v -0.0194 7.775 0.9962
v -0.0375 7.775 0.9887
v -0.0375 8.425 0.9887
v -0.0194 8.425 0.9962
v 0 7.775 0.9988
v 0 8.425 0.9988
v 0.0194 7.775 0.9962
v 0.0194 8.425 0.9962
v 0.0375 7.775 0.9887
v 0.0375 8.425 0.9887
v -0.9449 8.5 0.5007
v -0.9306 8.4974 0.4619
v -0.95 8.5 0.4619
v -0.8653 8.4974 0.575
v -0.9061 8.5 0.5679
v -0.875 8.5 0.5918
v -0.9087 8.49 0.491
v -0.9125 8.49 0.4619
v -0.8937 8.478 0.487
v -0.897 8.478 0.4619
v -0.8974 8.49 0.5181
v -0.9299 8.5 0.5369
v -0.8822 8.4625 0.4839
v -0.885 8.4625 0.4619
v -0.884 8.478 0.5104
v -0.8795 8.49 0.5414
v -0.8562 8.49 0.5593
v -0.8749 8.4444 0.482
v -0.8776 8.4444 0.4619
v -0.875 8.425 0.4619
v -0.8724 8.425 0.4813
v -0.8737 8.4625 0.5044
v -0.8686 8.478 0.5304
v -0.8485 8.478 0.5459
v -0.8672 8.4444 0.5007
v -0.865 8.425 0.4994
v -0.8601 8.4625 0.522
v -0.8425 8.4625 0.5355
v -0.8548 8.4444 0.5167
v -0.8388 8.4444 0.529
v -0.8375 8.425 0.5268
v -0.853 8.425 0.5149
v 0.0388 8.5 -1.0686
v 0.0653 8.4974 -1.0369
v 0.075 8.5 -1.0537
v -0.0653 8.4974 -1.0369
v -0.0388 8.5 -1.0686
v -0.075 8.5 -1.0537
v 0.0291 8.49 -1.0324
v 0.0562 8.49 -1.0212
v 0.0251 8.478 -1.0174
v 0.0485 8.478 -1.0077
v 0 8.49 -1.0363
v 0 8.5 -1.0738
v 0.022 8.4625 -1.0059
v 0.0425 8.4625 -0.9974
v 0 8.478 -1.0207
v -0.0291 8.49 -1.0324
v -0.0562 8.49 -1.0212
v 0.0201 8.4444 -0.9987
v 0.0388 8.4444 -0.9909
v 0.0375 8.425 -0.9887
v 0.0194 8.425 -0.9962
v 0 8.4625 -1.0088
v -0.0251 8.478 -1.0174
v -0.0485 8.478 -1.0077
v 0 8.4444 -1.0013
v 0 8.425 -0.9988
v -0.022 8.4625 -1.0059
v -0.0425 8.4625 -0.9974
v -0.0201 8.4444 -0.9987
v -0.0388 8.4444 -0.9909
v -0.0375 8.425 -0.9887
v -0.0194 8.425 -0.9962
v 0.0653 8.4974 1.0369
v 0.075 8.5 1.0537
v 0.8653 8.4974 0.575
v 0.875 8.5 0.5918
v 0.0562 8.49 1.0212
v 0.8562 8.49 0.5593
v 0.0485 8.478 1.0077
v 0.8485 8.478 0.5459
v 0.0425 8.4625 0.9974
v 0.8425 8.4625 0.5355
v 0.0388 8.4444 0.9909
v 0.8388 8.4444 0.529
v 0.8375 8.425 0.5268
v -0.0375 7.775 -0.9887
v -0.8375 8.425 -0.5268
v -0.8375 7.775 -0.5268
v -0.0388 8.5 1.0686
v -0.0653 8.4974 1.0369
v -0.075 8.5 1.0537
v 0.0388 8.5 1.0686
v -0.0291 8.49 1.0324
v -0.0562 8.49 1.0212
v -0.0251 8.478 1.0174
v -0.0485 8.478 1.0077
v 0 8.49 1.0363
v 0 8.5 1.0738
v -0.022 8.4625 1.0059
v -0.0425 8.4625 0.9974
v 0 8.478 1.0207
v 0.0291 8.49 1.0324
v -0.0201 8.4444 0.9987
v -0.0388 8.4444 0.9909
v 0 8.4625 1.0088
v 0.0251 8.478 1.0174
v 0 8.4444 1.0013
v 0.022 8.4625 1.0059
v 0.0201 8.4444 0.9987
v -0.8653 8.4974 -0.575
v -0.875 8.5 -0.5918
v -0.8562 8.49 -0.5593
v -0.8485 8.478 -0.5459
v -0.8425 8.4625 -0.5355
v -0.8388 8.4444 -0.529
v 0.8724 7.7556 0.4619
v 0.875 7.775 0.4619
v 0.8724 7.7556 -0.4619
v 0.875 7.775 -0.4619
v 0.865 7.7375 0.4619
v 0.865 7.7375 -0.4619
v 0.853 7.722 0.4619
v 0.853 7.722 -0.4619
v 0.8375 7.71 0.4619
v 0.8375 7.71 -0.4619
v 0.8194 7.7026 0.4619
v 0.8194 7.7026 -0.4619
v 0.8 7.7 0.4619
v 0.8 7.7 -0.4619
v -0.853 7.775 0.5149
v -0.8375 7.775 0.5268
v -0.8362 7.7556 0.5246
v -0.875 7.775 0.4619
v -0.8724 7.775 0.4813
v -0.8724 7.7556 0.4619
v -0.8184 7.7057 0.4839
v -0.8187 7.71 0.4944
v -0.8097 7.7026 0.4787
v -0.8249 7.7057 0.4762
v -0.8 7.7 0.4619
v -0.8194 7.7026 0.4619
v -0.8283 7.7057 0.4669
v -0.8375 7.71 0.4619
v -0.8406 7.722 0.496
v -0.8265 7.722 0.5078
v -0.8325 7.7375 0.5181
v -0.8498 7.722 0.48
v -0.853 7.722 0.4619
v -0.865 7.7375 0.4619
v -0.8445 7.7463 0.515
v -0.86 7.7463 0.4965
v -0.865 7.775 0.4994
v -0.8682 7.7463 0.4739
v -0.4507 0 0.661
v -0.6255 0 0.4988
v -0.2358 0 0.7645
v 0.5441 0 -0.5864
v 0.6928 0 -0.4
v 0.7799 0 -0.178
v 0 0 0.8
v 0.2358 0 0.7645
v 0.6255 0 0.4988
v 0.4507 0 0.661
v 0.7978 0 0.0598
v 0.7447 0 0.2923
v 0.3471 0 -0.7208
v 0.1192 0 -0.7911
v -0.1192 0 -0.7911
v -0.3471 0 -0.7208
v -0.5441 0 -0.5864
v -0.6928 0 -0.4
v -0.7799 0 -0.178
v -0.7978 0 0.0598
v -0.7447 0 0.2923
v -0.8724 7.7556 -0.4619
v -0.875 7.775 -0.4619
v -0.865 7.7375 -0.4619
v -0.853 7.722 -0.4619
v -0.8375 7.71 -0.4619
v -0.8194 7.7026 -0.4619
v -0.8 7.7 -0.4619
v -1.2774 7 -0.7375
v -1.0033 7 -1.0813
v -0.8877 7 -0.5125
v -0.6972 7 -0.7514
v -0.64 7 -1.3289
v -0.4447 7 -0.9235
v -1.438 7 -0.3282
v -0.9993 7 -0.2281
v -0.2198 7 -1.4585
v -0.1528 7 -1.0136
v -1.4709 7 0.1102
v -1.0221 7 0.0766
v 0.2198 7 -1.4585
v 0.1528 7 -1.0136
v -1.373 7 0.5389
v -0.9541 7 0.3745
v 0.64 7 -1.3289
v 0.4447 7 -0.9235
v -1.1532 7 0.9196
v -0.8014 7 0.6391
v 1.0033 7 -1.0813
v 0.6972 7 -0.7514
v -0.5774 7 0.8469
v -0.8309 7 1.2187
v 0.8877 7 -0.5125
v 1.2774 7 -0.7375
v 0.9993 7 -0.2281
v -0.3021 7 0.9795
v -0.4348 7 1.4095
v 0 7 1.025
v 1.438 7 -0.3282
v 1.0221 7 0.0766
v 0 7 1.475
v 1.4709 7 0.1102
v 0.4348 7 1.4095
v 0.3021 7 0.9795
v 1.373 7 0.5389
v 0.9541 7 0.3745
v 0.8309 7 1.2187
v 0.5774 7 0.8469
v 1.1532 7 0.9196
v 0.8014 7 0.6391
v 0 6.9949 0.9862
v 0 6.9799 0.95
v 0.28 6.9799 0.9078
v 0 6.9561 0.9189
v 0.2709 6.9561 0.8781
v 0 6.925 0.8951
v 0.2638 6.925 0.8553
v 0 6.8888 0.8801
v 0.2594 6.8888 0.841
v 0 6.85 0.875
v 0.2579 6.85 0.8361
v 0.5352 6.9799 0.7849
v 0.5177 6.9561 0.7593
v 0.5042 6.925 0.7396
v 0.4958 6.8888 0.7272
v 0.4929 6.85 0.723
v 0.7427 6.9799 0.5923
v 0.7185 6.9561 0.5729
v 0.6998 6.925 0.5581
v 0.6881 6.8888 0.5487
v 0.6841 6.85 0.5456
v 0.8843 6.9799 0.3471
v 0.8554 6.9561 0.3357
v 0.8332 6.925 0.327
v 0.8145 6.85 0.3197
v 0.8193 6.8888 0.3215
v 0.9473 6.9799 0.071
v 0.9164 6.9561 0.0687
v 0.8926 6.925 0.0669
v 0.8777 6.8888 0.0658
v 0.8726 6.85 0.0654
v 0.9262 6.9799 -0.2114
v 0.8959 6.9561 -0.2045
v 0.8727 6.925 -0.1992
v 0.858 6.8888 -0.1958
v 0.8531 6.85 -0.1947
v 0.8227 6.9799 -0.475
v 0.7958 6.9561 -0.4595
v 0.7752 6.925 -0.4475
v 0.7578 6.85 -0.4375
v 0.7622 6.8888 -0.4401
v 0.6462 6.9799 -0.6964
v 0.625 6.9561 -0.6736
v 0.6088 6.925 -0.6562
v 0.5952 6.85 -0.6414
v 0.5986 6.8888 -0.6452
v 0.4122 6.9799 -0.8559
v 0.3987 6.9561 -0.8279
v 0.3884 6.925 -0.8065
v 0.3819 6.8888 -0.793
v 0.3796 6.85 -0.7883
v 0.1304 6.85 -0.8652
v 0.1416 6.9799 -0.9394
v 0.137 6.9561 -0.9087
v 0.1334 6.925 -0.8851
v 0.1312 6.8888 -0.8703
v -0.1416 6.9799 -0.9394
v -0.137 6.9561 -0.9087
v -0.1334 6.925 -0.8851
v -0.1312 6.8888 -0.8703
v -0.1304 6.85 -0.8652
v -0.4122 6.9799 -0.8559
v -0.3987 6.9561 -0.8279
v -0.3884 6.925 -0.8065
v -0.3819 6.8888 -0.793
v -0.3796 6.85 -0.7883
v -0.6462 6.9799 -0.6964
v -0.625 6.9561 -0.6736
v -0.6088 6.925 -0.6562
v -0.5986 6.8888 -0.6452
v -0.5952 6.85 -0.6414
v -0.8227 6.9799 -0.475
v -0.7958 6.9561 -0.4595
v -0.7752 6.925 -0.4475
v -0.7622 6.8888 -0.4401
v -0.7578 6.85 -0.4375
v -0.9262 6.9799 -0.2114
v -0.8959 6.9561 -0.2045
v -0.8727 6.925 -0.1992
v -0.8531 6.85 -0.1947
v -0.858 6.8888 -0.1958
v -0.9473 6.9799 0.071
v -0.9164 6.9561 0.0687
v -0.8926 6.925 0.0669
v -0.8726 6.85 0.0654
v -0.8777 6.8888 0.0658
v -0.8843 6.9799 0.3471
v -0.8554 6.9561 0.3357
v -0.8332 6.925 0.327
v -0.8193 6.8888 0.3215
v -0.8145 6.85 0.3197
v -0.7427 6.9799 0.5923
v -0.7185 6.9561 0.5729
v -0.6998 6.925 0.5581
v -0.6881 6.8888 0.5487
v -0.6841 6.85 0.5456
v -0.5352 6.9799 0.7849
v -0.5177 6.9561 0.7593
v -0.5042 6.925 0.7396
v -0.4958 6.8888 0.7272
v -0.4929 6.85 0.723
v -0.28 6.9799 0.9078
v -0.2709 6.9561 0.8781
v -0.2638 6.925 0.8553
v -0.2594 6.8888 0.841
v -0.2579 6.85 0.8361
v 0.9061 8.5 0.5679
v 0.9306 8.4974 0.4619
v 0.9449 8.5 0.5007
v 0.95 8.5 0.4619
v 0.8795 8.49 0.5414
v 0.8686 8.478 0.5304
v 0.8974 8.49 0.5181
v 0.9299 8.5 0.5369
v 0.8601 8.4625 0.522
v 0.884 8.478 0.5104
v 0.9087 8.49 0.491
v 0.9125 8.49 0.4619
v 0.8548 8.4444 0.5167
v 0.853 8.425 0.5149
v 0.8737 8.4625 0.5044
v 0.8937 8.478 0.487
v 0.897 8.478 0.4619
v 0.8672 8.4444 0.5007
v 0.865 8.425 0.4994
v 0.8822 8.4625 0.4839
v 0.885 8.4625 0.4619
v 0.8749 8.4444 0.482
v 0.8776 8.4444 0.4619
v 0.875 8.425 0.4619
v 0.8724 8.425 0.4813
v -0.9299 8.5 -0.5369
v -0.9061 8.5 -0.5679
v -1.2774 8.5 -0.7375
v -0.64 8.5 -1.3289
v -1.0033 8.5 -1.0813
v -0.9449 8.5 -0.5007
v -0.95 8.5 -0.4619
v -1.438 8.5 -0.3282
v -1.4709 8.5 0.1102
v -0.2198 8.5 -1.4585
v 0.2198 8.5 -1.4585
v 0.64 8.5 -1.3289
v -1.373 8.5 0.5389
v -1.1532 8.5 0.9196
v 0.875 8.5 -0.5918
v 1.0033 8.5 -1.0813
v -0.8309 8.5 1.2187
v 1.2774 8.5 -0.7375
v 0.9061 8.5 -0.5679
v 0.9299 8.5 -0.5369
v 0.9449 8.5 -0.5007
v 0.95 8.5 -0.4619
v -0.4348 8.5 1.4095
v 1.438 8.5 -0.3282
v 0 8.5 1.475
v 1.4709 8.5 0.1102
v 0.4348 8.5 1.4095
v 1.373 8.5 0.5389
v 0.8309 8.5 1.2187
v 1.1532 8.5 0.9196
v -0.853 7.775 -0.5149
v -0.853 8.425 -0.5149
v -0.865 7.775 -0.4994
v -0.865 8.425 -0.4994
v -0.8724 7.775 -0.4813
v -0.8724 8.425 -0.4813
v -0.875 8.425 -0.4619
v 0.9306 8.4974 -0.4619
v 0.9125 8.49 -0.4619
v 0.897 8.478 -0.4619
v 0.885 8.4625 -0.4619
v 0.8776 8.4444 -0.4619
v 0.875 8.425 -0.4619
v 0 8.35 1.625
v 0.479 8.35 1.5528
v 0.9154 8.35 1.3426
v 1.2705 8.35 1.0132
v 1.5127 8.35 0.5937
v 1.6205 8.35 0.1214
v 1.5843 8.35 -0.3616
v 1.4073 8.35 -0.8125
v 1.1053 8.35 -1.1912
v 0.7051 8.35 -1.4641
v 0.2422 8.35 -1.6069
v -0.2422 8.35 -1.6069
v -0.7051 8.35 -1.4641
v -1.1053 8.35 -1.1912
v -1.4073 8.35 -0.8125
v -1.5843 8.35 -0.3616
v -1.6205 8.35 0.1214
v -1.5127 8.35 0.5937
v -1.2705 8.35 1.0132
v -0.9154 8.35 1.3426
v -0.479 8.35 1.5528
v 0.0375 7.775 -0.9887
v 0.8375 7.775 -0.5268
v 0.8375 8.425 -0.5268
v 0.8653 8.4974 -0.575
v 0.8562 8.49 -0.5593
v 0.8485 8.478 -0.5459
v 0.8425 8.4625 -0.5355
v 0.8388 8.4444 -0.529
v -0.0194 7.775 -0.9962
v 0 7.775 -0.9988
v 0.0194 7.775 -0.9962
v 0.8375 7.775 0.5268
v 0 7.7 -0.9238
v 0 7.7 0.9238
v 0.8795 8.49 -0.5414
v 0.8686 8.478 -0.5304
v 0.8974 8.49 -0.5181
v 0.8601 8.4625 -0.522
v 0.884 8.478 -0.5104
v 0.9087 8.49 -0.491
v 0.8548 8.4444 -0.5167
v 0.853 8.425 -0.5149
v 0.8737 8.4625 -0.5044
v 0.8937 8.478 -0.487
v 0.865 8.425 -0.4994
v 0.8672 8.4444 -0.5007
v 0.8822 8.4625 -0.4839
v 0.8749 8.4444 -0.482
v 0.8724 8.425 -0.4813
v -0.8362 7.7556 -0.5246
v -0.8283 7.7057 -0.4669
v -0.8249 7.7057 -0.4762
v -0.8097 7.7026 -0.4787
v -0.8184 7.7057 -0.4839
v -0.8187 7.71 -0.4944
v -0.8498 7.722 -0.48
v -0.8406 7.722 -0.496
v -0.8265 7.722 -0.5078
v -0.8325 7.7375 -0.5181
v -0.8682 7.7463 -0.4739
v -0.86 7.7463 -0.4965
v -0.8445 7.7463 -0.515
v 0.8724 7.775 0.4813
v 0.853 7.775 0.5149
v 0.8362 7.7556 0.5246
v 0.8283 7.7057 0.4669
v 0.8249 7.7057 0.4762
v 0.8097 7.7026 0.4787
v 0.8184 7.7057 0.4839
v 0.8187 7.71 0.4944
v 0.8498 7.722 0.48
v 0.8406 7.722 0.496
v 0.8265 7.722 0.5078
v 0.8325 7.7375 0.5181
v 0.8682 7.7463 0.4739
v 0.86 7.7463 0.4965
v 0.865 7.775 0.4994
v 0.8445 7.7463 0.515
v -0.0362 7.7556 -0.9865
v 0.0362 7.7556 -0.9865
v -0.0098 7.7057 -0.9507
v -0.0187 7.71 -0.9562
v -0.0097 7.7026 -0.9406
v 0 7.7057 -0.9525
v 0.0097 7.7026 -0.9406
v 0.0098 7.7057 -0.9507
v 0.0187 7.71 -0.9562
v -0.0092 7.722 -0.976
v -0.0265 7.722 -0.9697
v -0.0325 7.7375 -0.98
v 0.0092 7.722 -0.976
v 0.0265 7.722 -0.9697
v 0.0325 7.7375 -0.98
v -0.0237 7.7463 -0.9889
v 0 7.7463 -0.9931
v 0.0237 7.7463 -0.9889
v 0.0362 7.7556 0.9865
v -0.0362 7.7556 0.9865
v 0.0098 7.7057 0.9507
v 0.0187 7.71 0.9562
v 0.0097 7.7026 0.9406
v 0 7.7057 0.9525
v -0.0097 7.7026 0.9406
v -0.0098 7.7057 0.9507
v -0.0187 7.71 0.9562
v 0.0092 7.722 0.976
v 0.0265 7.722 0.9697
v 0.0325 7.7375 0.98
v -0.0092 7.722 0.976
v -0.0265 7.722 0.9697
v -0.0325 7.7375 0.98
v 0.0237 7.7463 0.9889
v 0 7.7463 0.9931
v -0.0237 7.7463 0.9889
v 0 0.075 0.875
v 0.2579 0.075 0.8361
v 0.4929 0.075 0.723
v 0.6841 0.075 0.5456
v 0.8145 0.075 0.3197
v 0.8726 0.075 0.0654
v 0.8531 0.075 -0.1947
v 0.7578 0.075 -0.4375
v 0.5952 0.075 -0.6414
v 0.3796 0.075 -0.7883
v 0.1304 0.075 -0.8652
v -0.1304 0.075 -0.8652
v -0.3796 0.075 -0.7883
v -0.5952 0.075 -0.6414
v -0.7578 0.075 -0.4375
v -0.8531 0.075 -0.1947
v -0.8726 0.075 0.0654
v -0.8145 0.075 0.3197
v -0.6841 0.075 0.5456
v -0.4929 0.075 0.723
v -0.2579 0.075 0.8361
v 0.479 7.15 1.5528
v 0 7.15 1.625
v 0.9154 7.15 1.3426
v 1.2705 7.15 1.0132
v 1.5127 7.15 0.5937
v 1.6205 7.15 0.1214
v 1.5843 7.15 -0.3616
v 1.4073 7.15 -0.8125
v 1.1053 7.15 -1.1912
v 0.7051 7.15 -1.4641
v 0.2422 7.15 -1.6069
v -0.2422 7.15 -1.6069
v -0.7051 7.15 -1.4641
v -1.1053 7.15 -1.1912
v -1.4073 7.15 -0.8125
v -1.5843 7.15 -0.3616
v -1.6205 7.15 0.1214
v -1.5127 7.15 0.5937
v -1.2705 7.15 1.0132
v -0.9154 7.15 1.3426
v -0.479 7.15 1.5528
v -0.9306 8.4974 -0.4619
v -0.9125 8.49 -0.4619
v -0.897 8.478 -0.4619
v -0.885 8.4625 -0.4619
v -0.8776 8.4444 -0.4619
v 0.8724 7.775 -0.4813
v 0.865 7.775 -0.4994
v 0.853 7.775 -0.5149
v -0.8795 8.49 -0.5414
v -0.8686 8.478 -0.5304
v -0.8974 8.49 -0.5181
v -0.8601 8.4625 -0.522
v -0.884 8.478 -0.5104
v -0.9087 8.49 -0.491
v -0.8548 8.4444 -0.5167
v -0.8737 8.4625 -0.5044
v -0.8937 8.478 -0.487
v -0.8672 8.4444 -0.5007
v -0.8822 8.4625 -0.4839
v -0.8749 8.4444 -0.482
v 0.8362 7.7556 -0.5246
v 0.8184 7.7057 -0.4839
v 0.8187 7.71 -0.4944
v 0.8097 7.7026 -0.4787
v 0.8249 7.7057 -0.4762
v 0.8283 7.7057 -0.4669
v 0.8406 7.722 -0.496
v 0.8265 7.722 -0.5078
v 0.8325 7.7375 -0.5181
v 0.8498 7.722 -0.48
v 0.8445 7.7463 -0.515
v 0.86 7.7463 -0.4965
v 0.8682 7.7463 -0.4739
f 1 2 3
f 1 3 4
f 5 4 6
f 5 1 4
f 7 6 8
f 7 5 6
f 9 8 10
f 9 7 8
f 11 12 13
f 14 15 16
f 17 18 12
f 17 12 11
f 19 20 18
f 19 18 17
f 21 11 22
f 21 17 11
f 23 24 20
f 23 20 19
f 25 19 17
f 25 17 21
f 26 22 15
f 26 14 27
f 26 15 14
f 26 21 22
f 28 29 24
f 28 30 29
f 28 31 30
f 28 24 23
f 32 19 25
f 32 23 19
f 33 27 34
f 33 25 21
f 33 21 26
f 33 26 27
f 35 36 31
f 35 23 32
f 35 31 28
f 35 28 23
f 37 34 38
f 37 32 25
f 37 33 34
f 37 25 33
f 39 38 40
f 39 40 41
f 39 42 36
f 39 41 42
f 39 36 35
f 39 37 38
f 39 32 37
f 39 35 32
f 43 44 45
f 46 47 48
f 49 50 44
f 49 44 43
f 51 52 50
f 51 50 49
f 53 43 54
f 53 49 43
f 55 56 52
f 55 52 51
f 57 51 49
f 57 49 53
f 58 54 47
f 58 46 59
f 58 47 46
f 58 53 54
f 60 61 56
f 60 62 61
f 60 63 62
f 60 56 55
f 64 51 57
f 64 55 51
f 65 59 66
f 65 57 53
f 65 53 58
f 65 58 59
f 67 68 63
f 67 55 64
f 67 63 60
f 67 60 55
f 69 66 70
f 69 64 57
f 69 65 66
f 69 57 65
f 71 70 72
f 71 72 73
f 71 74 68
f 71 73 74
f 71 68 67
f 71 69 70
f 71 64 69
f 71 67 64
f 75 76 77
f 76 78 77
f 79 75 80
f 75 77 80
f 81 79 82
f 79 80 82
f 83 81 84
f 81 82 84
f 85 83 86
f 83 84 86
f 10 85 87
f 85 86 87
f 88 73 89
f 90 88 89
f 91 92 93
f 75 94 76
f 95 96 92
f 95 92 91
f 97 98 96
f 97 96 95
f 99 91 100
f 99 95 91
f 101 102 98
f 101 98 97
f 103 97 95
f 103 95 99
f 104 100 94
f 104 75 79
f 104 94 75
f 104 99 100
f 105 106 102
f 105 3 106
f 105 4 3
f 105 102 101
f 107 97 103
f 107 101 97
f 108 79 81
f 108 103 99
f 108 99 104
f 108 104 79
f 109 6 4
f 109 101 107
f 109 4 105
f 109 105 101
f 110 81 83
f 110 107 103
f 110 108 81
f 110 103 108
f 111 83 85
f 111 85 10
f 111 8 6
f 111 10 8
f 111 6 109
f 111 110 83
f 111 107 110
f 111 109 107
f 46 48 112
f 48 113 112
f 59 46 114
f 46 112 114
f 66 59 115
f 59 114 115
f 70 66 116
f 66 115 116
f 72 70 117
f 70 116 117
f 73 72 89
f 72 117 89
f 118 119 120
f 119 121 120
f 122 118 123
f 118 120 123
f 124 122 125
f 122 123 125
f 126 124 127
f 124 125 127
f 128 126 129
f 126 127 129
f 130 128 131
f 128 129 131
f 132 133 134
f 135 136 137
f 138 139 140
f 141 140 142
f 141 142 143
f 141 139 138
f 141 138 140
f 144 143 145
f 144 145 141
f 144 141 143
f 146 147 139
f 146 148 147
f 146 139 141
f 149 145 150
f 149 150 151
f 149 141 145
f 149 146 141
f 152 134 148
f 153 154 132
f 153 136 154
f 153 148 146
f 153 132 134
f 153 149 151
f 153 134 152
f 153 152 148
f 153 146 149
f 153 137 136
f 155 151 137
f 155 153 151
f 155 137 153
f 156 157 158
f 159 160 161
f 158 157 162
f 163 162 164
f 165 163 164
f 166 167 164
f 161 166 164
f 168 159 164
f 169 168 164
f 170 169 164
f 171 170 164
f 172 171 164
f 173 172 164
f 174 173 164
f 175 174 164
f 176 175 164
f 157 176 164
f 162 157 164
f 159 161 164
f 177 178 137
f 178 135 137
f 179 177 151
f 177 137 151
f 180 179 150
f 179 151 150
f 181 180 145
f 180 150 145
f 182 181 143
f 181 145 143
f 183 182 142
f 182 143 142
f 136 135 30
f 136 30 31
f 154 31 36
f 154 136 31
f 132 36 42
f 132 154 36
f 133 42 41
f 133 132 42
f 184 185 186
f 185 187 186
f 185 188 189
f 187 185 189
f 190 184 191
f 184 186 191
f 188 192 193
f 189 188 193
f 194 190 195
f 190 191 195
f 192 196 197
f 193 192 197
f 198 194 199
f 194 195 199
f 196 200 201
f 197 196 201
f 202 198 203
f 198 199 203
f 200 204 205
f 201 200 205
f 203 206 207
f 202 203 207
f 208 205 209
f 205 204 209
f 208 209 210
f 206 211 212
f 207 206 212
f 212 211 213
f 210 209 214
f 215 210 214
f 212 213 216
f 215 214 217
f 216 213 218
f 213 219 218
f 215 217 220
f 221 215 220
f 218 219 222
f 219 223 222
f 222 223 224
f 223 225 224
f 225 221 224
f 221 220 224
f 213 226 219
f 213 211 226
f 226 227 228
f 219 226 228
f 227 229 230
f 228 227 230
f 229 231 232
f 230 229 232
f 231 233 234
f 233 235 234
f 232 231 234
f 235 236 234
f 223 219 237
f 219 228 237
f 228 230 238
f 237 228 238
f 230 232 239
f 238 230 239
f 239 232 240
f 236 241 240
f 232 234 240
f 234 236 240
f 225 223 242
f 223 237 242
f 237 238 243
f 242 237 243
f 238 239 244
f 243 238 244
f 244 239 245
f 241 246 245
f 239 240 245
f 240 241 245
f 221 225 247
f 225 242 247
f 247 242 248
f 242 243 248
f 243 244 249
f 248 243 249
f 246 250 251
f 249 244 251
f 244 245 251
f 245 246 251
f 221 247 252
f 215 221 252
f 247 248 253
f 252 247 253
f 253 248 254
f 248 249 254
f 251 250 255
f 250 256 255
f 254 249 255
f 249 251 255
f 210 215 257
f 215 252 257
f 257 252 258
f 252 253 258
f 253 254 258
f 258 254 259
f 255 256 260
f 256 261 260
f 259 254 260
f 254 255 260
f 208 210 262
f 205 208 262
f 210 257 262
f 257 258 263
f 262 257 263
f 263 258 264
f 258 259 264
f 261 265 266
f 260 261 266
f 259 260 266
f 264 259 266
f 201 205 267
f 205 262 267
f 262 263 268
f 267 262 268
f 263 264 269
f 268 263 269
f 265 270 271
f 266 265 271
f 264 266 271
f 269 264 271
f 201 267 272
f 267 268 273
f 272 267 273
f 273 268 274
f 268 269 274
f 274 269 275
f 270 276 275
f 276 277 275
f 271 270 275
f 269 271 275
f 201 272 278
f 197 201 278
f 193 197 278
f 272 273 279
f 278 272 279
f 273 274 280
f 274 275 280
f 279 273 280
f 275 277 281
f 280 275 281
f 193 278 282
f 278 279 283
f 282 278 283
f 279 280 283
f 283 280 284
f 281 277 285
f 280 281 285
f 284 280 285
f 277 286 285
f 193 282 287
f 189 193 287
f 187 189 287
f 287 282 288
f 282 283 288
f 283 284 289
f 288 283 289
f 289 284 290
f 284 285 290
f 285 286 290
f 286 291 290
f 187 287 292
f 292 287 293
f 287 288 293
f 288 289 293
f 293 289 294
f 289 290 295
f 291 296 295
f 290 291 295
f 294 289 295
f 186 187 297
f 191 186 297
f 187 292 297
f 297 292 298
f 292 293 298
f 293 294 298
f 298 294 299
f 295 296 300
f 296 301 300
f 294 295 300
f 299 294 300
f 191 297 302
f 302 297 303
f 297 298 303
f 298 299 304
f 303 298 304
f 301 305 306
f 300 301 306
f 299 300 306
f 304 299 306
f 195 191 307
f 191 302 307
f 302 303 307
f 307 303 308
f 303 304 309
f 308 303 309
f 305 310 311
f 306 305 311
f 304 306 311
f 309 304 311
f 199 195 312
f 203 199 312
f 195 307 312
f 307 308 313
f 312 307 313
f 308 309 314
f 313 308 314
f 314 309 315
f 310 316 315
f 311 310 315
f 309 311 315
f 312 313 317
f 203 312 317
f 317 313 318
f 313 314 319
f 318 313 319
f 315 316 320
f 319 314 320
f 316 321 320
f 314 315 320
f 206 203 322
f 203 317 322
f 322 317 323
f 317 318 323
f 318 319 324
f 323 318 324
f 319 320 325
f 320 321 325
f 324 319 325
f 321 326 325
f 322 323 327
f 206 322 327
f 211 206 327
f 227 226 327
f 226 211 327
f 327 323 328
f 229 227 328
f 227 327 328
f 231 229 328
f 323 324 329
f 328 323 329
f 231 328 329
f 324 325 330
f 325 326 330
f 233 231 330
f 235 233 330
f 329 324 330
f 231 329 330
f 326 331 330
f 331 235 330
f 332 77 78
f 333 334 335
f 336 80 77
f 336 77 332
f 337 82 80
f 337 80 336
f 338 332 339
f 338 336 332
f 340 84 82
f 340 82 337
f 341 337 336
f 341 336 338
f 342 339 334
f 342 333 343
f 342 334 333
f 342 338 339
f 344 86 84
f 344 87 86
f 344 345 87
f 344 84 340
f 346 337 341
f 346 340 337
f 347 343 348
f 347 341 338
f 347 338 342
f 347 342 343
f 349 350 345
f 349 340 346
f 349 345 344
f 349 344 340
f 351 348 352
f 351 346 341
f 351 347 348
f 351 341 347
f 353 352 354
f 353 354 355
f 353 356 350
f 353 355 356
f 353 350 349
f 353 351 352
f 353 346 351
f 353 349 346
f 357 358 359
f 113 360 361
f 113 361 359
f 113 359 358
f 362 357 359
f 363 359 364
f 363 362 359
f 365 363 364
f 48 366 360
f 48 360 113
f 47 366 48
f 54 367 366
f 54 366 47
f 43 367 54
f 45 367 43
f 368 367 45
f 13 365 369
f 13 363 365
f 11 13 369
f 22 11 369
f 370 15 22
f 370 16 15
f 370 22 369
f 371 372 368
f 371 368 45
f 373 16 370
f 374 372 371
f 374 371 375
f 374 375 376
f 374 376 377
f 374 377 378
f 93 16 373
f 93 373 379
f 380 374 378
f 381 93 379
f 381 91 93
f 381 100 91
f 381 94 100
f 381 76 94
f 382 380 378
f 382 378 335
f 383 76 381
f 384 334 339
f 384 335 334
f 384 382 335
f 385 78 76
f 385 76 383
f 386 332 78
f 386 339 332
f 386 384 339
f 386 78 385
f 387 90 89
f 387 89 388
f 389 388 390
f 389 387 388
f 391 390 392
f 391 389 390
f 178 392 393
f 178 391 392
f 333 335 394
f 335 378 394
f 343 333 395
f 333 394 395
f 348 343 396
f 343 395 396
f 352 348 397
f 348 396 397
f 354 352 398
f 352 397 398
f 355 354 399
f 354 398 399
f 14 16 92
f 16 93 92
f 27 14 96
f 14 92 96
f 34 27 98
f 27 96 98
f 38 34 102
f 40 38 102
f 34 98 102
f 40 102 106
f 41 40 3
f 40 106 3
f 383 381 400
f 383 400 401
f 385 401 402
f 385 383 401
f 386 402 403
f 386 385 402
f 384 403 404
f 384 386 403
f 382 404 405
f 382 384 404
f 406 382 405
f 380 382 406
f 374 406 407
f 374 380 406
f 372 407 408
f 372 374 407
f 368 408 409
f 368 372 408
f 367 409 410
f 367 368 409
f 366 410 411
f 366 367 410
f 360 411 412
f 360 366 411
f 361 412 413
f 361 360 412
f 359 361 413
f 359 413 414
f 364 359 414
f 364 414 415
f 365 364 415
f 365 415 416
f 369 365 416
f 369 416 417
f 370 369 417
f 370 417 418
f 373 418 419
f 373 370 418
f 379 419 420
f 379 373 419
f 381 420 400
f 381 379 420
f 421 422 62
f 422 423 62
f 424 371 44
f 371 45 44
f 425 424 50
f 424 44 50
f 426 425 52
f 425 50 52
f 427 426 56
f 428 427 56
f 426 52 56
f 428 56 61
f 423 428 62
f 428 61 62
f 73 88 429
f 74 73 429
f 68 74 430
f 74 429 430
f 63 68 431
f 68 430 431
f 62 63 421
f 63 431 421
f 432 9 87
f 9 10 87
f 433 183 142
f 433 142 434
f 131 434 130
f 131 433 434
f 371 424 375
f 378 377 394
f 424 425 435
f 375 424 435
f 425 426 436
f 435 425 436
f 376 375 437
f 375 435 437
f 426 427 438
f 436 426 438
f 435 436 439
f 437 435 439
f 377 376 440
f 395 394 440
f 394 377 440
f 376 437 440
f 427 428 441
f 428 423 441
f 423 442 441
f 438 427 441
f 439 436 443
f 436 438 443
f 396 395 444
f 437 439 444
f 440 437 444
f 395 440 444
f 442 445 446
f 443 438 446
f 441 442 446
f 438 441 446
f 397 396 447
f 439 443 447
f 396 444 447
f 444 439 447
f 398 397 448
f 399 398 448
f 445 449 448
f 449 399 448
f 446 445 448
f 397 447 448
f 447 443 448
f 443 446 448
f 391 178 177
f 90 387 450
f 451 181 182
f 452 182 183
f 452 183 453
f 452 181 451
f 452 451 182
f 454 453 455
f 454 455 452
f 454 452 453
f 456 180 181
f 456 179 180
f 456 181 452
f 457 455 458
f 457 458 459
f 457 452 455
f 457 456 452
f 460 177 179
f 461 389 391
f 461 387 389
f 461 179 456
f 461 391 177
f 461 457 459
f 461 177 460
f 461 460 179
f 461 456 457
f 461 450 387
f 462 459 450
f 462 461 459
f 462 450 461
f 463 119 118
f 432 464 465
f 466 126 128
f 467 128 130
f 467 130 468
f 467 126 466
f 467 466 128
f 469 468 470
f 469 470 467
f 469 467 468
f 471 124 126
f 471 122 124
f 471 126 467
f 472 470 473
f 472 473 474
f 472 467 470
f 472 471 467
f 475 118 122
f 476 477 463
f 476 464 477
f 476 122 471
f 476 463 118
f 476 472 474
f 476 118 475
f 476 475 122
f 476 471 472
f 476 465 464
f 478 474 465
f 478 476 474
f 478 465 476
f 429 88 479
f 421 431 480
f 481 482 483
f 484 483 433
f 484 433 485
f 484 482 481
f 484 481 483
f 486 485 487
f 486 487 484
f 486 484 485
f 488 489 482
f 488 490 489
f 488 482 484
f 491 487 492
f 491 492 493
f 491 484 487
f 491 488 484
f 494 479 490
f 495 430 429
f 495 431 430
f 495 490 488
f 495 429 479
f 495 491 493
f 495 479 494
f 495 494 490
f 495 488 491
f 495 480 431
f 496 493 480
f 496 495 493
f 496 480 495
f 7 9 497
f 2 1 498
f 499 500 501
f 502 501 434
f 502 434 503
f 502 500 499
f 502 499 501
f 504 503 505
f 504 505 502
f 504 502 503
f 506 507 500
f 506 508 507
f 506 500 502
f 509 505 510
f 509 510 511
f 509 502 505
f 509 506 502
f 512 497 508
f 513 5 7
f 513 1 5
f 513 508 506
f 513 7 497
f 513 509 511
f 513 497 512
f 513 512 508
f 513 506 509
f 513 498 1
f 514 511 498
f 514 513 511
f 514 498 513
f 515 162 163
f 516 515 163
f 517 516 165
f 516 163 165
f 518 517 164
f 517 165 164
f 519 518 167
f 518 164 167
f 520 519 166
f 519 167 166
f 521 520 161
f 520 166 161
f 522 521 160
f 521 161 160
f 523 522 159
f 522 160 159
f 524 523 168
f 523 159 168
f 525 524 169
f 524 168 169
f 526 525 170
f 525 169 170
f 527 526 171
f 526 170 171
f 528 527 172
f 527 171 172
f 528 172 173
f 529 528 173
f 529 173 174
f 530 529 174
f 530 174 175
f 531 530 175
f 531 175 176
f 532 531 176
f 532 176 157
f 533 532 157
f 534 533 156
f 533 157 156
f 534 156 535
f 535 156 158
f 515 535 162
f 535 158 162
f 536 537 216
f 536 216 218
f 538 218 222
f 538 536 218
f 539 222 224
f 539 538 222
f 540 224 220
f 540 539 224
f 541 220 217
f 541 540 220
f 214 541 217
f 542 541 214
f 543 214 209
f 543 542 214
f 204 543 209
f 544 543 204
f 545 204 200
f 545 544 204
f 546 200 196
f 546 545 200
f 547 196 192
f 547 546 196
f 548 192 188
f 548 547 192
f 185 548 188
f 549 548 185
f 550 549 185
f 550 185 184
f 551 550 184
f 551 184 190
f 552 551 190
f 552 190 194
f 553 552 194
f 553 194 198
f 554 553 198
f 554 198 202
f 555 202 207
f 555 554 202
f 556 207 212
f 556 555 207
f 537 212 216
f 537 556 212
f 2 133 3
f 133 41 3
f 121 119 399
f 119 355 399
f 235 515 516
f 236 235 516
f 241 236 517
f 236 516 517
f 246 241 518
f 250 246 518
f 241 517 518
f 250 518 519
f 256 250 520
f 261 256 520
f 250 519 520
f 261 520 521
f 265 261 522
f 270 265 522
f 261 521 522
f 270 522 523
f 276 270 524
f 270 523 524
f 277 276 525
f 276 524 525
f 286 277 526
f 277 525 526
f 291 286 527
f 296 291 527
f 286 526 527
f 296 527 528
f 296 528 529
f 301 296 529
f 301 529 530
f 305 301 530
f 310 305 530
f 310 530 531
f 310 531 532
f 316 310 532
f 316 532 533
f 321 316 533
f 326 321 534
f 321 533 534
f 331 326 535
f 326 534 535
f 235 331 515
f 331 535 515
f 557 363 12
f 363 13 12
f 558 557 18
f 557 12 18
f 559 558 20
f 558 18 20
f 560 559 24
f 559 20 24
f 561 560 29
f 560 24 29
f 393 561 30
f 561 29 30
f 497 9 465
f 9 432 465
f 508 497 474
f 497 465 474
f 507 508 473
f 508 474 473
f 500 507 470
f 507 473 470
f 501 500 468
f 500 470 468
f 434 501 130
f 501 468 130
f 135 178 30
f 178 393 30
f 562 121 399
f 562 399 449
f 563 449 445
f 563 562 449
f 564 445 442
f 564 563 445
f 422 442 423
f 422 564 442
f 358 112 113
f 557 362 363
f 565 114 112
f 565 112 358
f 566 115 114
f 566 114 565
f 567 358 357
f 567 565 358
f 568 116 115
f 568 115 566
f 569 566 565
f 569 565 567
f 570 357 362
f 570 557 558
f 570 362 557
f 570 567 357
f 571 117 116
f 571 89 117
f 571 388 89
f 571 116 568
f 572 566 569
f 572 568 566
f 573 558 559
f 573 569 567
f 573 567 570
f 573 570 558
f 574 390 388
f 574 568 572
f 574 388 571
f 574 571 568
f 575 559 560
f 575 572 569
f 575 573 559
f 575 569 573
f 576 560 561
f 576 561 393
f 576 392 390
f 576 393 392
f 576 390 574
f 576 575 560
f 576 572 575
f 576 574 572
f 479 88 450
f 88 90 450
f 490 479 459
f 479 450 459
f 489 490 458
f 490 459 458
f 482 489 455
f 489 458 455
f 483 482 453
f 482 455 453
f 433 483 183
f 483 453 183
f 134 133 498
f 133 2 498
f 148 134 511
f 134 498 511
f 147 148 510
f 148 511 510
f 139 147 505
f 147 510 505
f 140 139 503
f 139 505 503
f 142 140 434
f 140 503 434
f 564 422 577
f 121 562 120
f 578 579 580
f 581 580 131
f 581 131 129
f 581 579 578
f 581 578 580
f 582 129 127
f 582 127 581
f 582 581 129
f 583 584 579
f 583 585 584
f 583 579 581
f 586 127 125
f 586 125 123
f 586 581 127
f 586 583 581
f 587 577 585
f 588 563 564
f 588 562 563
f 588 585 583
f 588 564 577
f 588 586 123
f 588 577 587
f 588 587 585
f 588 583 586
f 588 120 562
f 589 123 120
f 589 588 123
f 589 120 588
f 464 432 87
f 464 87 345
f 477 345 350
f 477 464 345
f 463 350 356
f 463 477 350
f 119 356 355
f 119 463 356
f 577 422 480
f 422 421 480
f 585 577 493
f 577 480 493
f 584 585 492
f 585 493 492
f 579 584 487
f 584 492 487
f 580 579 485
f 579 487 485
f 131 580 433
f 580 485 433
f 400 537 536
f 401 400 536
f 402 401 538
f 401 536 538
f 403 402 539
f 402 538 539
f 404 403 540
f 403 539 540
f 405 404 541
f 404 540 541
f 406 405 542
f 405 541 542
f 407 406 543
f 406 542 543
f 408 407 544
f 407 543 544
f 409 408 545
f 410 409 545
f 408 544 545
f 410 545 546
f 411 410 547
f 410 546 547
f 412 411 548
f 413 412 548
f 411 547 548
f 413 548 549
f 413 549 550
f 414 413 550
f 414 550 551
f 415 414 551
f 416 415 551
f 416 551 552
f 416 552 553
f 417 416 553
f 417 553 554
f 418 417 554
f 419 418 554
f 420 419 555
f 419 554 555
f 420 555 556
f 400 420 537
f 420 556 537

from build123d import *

# Parameters (mm, degrees)
SKETCH1_R           = 0.875
BOSS_EXTRUDE1_DEPTH = 7
SKETCH2_R           = 1.625
BOSS_EXTRUDE2_DEPTH = 1.5
FILLET1_R           = 0.15
CHAMFER1_SIZE       = 0.15
CUT_EXTRUDE1_DEPTH  = 0.8
CHAMFER2_SIZE       = 0.075
FILLET2_R           = 0.075


with BuildPart() as part:
    # Sketch1 → Boss-Extrude1 (new body)
    with BuildSketch(Plane(origin=(0, 0, 0), x_dir=(1, 0, 0), z_dir=(0, 1, 0))):
        with Locations(Location((0, 0, 0), (0, 0, 270))):
            Circle(SKETCH1_R)
    extrude(amount=BOSS_EXTRUDE1_DEPTH)

    # Sketch2 → Boss-Extrude2 (add)
    with BuildSketch(Plane(origin=(0, 7, 0), x_dir=(1, 0, 0), z_dir=(0, 1, 0))):
        with Locations(Location((0, 0, 0), (0, 0, 270))):
            Circle(SKETCH2_R)
    extrude(amount=BOSS_EXTRUDE2_DEPTH)

    # Fillet1
    fillet1_edges = [part.edges().sort_by_distance(p)[0] for p in [
        (0, 7, -0.875),
    ]]
    fillet(fillet1_edges, radius=FILLET1_R)

    # Chamfer1
    chamfer1_edges = [part.edges().sort_by_distance(p)[0] for p in [
        (0, 7, -1.625),
        (0, 8.5, -1.625),
    ]]
    chamfer(chamfer1_edges, length=CHAMFER1_SIZE)

    # Sketch3 → Cut-Extrude1 (cut)
    with BuildSketch(Plane(origin=(0, 8.5, 0), x_dir=(1, 0, 0), z_dir=(0, 1, 0))):
        Polygon((0, 1.010362971), (-0.875, 0.505181486), (-0.875, -0.505181486), (0, -1.010362971), (0.875, -0.505181486), (0.875, 0.505181486), align=None)
    extrude(amount=-CUT_EXTRUDE1_DEPTH, mode=Mode.SUBTRACT)

    # Chamfer2
    chamfer2_edges = [part.edges().sort_by_distance(p)[0] for p in [
        (0, 0, -0.875),
    ]]
    chamfer(chamfer2_edges, length=CHAMFER2_SIZE)

    # Fillet2
    fillet2_edges = [part.edges().sort_by_distance(p)[0] for p in [
        (0.4375, 7.7, -0.757772228),
        (0, 8.1, -1.010362971),
        (0.875, 7.7, 0),
        (0.875, 8.1, -0.505181486),
        (0.4375, 7.7, 0.757772228),
        (0.875, 8.1, 0.505181486),
        (-0.4375, 7.7, 0.757772228),
        (0, 8.1, 1.010362971),
        (-0.875, 7.7, 0),
        (-0.875, 8.1, 0.505181486),
        (-0.4375, 7.7, -0.757772228),
        (-0.875, 8.1, -0.505181486),
        (0.4375, 8.5, -0.757772228),
        (-0.4375, 8.5, -0.757772228),
        (-0.875, 8.5, 0),
        (-0.4375, 8.5, 0.757772228),
        (0.4375, 8.5, 0.757772228),
        (0.875, 8.5, 0),
    ]]
    fillet(fillet2_edges, radius=FILLET2_R)


solid = part.part
